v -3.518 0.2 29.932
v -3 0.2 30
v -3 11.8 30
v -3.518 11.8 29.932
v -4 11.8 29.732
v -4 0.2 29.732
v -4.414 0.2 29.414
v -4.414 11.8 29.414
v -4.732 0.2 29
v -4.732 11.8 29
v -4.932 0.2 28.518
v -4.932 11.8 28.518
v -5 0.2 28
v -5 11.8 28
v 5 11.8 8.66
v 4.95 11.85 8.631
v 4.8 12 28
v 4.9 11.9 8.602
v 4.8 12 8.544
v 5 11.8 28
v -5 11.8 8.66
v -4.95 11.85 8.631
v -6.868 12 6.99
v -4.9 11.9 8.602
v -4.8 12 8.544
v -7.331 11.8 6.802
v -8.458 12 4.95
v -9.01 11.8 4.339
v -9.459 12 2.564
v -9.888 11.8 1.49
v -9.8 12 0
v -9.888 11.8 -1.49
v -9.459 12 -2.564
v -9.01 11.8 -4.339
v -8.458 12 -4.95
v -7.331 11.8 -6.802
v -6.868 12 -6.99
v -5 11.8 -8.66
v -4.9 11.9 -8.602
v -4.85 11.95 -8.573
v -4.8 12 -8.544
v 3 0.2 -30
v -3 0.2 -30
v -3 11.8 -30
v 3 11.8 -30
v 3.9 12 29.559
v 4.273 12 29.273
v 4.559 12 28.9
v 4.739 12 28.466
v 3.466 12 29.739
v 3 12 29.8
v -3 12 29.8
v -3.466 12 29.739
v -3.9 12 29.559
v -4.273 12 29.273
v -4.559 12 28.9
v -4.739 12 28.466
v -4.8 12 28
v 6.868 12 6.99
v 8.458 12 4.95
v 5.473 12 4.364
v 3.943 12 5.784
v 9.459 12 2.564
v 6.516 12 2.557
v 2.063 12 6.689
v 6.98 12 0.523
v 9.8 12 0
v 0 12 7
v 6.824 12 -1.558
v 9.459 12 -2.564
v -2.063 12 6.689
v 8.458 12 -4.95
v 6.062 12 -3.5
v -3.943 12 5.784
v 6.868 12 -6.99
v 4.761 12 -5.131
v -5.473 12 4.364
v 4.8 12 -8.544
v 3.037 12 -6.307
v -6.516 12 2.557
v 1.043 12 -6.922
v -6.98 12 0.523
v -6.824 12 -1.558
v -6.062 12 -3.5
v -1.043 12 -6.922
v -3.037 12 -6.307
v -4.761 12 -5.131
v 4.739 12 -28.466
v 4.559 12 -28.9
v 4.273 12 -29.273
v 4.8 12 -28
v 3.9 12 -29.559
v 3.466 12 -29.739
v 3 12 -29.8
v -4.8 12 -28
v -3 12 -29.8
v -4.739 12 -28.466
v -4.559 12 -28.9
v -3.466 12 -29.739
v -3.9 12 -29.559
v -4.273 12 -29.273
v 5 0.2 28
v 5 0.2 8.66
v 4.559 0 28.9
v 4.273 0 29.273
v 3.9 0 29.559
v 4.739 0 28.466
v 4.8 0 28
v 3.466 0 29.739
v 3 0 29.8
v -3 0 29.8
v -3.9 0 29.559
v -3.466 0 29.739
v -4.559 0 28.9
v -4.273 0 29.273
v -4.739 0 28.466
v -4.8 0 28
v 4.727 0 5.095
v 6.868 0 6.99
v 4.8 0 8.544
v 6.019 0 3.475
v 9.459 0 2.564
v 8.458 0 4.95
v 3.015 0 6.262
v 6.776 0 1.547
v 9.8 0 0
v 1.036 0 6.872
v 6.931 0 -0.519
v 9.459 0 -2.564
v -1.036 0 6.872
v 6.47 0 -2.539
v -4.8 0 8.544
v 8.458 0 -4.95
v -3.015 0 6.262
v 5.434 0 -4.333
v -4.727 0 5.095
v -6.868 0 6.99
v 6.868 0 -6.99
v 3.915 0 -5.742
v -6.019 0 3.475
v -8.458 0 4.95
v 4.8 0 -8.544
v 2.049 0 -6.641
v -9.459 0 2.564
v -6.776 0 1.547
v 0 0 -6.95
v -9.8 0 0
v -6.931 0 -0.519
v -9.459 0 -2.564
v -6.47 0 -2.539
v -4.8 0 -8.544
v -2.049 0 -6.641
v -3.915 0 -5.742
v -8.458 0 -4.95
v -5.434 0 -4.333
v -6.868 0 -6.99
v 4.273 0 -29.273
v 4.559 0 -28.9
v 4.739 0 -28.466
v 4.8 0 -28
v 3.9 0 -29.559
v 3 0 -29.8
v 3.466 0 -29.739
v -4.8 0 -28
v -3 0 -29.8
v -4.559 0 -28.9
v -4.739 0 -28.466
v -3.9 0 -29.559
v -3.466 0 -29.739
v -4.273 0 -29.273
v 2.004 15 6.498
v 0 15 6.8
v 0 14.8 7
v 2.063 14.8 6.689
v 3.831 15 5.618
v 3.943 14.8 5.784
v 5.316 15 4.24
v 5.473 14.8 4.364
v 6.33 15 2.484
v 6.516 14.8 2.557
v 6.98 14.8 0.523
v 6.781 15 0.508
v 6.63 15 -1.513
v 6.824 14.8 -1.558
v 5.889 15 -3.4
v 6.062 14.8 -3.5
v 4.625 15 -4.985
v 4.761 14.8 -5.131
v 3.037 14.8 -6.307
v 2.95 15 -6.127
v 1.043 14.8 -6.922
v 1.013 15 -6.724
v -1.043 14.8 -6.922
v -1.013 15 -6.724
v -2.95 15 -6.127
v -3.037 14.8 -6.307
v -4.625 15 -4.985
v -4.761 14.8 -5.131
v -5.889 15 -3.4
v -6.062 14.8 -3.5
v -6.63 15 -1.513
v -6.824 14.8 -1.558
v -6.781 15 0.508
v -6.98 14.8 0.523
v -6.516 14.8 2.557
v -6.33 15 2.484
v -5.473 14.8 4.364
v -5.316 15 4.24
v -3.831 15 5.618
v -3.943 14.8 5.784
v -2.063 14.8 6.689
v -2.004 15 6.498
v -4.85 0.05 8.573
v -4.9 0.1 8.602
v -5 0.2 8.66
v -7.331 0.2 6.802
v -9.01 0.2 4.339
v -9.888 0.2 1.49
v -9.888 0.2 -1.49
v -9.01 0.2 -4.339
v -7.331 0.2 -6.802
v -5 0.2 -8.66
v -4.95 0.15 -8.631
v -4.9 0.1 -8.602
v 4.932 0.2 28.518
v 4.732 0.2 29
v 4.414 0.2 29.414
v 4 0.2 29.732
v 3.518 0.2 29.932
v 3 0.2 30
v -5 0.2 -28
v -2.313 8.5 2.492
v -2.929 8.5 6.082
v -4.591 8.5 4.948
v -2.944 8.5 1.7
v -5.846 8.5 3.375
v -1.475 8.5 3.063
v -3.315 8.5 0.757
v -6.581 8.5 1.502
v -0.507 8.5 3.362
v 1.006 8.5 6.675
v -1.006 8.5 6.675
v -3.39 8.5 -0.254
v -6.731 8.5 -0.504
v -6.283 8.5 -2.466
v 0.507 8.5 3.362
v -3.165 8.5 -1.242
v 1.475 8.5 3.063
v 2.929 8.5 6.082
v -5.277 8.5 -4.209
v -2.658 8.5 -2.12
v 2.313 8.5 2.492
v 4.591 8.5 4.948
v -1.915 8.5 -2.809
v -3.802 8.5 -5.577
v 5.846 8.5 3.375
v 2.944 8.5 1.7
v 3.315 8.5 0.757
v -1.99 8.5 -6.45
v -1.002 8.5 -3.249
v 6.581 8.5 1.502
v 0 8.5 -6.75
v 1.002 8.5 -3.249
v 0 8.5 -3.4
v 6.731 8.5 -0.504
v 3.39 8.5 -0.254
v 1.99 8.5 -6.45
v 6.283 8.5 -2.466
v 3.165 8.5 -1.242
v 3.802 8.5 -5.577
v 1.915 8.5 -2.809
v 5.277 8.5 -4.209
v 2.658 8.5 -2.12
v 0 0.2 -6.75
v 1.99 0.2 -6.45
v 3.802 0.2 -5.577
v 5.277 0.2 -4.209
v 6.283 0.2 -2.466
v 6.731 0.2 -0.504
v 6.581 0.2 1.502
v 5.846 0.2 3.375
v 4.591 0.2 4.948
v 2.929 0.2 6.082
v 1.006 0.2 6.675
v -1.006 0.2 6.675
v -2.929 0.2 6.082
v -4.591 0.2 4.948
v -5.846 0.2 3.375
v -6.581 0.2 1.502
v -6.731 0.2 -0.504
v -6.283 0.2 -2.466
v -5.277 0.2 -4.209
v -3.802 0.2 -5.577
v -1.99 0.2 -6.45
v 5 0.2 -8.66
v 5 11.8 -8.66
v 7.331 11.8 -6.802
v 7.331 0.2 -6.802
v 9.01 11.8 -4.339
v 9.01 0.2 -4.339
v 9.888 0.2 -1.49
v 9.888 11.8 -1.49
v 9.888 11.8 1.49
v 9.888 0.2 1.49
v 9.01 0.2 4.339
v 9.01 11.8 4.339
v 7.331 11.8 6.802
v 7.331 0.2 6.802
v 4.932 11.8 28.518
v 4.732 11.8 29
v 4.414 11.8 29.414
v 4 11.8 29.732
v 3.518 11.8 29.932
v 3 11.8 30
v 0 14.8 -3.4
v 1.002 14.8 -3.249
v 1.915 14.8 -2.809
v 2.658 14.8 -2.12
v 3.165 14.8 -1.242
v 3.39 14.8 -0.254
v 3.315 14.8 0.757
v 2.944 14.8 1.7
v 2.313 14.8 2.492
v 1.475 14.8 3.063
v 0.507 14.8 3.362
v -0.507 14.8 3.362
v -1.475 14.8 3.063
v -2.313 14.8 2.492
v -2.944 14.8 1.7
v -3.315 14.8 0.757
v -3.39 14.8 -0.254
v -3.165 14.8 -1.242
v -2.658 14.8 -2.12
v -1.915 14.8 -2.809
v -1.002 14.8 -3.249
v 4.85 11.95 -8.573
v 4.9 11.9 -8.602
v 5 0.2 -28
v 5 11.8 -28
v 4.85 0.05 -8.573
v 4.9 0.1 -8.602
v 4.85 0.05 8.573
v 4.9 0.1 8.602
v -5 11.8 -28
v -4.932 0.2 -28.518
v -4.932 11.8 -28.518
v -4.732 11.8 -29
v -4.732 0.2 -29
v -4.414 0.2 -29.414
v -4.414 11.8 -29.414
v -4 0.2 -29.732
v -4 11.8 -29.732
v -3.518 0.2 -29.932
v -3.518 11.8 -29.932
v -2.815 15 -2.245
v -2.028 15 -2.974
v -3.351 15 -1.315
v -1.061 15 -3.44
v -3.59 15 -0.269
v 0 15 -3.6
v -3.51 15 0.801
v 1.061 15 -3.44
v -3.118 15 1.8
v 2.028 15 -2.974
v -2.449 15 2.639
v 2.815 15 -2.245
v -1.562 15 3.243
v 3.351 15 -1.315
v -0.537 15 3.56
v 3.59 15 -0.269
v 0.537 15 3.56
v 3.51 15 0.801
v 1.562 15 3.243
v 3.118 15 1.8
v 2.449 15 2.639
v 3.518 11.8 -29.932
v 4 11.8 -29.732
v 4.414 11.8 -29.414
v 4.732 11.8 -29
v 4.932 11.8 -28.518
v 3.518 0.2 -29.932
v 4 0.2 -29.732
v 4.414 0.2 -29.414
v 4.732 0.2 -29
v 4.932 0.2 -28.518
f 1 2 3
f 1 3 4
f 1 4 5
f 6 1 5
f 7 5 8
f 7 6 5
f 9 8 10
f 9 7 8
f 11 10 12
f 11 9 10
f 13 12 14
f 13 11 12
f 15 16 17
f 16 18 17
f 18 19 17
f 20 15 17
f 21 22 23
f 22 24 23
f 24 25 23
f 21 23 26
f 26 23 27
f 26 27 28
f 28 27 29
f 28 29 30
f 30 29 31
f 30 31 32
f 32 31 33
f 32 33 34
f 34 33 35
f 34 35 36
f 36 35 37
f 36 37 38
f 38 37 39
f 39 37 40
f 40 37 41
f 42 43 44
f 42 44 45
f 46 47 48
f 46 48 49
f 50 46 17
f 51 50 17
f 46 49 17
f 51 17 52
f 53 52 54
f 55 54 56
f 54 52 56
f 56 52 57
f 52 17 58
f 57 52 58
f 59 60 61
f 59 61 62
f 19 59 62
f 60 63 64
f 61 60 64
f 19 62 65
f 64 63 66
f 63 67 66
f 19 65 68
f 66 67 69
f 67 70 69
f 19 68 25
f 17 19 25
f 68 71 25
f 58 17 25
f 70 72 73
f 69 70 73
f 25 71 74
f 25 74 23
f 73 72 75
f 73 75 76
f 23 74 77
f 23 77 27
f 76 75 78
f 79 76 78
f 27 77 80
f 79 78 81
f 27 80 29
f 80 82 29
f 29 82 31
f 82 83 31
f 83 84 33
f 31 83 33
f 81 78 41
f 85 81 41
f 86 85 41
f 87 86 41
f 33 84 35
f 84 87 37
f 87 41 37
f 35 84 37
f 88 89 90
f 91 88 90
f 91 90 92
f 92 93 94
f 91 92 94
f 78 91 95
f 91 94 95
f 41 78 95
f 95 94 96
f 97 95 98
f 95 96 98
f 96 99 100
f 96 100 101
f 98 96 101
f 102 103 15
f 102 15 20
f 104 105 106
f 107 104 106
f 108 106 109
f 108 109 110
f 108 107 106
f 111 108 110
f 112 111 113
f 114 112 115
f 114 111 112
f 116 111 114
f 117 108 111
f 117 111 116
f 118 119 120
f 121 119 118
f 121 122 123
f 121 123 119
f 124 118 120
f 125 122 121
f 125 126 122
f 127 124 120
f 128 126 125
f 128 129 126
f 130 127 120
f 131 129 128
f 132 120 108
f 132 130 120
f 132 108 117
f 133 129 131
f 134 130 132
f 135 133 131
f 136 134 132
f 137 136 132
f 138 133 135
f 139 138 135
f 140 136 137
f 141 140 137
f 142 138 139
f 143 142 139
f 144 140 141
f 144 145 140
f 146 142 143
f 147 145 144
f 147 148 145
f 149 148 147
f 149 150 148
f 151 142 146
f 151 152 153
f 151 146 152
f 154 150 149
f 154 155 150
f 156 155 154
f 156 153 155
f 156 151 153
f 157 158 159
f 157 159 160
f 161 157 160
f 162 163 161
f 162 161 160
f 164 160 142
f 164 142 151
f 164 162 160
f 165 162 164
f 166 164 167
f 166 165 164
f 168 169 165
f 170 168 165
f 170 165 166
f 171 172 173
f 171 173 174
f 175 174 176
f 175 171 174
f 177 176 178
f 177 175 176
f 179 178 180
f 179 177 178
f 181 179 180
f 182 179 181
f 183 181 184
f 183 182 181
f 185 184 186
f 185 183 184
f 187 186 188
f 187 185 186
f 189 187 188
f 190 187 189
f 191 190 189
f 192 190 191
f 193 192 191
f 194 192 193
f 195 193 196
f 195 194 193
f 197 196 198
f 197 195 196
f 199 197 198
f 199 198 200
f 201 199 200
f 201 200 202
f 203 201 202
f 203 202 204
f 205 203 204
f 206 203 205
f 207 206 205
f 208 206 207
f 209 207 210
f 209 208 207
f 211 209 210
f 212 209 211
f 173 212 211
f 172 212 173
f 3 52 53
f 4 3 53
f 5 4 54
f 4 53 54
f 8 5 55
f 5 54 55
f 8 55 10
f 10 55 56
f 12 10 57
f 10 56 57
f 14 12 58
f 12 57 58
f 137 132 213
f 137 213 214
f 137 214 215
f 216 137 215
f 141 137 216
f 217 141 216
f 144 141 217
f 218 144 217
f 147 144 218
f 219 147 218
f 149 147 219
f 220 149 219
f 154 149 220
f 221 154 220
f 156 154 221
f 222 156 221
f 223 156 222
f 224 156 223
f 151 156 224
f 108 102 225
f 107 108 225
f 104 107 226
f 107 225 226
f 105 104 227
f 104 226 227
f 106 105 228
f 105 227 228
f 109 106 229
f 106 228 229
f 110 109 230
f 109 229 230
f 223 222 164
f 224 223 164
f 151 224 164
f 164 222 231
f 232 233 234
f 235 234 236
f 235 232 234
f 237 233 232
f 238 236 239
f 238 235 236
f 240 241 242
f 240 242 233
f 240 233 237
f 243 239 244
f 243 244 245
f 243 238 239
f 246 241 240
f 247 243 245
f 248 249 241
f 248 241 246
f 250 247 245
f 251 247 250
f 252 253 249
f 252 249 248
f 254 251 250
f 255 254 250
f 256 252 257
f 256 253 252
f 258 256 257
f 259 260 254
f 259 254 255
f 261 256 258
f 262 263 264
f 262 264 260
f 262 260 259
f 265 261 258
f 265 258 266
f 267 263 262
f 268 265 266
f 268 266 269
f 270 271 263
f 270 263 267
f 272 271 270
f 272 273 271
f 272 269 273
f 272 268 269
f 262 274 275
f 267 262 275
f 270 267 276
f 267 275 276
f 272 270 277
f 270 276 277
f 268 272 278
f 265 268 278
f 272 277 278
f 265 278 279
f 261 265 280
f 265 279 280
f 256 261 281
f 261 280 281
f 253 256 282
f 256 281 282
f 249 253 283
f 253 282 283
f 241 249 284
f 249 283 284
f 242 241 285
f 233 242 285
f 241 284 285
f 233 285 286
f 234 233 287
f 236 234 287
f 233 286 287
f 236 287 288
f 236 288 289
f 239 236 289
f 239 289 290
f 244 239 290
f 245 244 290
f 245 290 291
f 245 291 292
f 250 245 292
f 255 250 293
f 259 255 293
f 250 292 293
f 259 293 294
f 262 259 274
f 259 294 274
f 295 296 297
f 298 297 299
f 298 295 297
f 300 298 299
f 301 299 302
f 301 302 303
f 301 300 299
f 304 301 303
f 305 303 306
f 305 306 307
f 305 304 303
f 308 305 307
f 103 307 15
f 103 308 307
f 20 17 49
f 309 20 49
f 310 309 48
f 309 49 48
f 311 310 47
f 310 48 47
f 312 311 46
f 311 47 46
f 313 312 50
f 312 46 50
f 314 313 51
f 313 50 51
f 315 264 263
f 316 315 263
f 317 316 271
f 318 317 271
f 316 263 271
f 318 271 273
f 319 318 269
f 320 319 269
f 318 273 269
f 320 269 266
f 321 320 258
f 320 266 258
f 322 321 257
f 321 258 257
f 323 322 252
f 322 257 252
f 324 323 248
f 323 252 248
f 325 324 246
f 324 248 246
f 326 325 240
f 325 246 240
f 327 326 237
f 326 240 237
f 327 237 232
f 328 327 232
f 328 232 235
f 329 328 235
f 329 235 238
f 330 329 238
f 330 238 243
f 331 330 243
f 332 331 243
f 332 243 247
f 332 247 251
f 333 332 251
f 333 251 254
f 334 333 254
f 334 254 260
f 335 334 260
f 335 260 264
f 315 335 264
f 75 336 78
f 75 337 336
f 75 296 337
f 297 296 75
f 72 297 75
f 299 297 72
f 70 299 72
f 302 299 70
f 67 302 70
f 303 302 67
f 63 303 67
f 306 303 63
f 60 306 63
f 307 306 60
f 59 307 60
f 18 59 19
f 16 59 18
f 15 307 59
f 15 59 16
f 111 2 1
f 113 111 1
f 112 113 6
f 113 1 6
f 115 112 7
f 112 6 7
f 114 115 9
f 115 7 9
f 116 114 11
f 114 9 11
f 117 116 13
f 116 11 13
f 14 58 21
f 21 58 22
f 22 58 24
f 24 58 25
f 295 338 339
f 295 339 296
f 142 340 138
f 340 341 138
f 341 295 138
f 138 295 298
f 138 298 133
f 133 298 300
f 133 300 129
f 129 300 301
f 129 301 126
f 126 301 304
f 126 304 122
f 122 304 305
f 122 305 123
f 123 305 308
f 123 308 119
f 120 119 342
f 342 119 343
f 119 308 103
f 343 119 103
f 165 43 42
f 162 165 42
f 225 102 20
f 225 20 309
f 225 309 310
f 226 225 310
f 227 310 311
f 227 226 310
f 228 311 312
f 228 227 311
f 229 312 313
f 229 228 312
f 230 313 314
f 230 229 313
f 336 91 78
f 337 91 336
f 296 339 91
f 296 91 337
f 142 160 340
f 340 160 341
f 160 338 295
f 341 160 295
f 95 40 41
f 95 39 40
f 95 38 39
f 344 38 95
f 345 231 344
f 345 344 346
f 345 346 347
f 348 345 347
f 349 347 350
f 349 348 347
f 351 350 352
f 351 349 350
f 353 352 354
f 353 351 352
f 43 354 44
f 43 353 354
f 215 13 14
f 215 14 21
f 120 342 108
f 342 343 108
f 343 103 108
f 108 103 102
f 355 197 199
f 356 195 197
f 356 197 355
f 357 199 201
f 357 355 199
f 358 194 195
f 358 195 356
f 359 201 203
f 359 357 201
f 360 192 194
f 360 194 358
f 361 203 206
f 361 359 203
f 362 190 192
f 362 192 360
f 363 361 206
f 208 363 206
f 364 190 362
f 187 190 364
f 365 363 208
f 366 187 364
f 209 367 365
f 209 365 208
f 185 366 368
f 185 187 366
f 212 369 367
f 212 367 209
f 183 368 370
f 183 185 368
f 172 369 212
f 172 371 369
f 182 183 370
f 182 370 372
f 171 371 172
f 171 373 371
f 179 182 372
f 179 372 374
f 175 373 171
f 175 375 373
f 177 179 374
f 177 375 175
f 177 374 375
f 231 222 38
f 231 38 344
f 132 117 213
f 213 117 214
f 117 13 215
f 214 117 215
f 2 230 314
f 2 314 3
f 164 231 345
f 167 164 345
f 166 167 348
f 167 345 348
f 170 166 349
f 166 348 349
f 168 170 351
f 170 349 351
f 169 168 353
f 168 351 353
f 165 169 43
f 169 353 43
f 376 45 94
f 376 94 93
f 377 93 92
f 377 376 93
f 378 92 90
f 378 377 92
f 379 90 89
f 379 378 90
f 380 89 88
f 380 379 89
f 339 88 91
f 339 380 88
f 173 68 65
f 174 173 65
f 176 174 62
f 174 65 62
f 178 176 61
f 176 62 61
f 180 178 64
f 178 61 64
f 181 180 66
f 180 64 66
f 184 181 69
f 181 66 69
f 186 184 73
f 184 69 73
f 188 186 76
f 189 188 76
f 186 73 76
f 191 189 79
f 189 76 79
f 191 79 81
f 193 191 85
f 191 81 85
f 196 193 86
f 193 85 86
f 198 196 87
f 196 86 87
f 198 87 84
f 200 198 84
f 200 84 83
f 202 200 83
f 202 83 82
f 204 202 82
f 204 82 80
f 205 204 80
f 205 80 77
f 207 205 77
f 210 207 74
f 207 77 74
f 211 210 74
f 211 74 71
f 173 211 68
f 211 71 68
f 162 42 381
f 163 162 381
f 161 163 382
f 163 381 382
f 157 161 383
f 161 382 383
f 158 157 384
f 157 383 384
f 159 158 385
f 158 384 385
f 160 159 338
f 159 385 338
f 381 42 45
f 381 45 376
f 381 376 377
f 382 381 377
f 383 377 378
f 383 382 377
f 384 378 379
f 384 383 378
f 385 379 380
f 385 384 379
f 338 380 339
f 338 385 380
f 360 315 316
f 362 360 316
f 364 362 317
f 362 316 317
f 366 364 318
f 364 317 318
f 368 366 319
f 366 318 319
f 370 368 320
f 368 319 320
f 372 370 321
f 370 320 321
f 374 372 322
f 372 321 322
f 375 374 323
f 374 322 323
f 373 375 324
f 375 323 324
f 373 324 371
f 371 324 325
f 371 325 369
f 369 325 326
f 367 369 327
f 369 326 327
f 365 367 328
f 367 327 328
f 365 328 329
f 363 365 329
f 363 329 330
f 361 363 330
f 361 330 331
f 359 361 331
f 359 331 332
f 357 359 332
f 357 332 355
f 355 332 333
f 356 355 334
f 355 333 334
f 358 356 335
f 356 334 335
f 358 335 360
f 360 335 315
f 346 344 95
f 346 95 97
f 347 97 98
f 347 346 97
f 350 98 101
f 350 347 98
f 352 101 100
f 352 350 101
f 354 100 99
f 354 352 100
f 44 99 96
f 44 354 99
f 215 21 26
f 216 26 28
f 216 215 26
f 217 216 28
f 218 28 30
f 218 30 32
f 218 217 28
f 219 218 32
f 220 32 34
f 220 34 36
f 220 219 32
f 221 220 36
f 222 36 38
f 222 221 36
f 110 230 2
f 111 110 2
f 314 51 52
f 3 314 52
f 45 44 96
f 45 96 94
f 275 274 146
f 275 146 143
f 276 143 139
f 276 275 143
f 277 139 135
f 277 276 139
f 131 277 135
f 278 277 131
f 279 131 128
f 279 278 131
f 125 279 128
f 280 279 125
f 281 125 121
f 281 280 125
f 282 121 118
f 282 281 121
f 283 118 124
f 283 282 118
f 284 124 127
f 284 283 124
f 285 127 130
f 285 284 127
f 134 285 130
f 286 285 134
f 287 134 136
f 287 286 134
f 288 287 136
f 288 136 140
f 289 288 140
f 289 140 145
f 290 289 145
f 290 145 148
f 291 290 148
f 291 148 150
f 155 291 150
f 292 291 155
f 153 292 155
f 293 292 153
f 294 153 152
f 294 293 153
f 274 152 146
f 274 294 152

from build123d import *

# Parameters (mm, degrees)
EXTRUDE_1_DEPTH     = 12
SKETCH_2_R          = 6.75
CUT_EXTRUDE_1_DEPTH = 8.5
SKETCH_4_R          = 7
EXTRUDE_2_DEPTH     = 3
SKETCH_3_R          = 3.4
CUT_EXTRUDE_2_DEPTH = 33.74522866
CHAMFER_1_SIZE      = 0.2


with BuildPart() as part:
    # 草图1 → 凸台-拉伸1 (new body)
    with BuildSketch(Plane(origin=(0, 0, 0), x_dir=(1, 0, 0), z_dir=(0, 1, 0))):
        with BuildLine():
            Line((-5, -28), (-5, -8.660254038))
            ThreePointArc((-5, -8.660254038), (-10, 0), (-5, 8.660254038))
            Line((-5, 8.660254038), (-5, 28))
            ThreePointArc((-5, 28), (-4.414213562, 29.414213562), (-3, 30))
            Line((-3, 30), (3, 30))
            ThreePointArc((3, 30), (4.414213562, 29.414213562), (5, 28))
            Line((5, 28), (5, 8.660254038))
            ThreePointArc((5, 8.660254038), (10, 0), (5, -8.660254038))
            Line((5, -8.660254038), (5, -28))
            ThreePointArc((5, -28), (4.414213562, -29.414213562), (3, -30))
            Line((3, -30), (-3, -30))
            ThreePointArc((-3, -30), (-4.414213562, -29.414213562), (-5, -28))
        make_face()
    extrude(amount=EXTRUDE_1_DEPTH)

    # 草图2 → 切除-拉伸1 (cut)
    with BuildSketch(Plane.XZ):
        with Locations(Location((0, 0, 0), (0, 0, 270))):
            Circle(SKETCH_2_R)
    extrude(amount=-CUT_EXTRUDE_1_DEPTH, mode=Mode.SUBTRACT)

    # 草图4 → 凸台-拉伸2 (add)
    with BuildSketch(Plane(origin=(0, 12, 0), x_dir=(1, 0, 0), z_dir=(0, 1, 0))):
        with Locations(Location((0, 0, 0), (0, 0, 270))):
            Circle(SKETCH_4_R)
    extrude(amount=EXTRUDE_2_DEPTH)

    # 草图3 → 切除-拉伸2 (cut, through all)
    with BuildSketch(Plane.XZ.offset(-8.5)):
        with Locations(Location((0, 0, 0), (0, 0, 270))):
            Circle(SKETCH_3_R)
    extrude(amount=-CUT_EXTRUDE_2_DEPTH, mode=Mode.SUBTRACT)

    # 倒角1
    chamfer_1_edges = [part.edges().sort_by_distance(p)[0] for p in [
        (5, 0, 18.330127019),
        (4.414213562, 0, 29.414213562),
        (4.414213562, 12, -29.414213562),
        (0, 0, 30),
        (-4.414213562, 0, 29.414213562),
        (-5, 0, 18.330127019),
        (-10, 0, 0),
        (-5, 0, -18.330127019),
        (-4.414213562, 0, -29.414213562),
        (0, 0, -30),
        (4.414213562, 0, -29.414213562),
        (5, 0, -18.330127019),
        (10, 0, 0),
        (0, 12, -30),
        (-4.414213562, 12, -29.414213562),
        (-5, 12, -18.330127019),
        (-10, 12, 0),
        (-5, 12, 18.330127019),
        (-4.414213562, 12, 29.414213562),
        (0, 0, 6.75),
        (0, 12, 30),
        (0, 15, -7),
        (4.414213562, 12, 29.414213562),
        (0, 15, 3.4),
        (5, 12, 18.330127019),
        (10, 12, 0),
        (5, 12, -18.330127019),
    ]]
    chamfer(chamfer_1_edges, length=CHAMFER_1_SIZE)


solid = part.part
